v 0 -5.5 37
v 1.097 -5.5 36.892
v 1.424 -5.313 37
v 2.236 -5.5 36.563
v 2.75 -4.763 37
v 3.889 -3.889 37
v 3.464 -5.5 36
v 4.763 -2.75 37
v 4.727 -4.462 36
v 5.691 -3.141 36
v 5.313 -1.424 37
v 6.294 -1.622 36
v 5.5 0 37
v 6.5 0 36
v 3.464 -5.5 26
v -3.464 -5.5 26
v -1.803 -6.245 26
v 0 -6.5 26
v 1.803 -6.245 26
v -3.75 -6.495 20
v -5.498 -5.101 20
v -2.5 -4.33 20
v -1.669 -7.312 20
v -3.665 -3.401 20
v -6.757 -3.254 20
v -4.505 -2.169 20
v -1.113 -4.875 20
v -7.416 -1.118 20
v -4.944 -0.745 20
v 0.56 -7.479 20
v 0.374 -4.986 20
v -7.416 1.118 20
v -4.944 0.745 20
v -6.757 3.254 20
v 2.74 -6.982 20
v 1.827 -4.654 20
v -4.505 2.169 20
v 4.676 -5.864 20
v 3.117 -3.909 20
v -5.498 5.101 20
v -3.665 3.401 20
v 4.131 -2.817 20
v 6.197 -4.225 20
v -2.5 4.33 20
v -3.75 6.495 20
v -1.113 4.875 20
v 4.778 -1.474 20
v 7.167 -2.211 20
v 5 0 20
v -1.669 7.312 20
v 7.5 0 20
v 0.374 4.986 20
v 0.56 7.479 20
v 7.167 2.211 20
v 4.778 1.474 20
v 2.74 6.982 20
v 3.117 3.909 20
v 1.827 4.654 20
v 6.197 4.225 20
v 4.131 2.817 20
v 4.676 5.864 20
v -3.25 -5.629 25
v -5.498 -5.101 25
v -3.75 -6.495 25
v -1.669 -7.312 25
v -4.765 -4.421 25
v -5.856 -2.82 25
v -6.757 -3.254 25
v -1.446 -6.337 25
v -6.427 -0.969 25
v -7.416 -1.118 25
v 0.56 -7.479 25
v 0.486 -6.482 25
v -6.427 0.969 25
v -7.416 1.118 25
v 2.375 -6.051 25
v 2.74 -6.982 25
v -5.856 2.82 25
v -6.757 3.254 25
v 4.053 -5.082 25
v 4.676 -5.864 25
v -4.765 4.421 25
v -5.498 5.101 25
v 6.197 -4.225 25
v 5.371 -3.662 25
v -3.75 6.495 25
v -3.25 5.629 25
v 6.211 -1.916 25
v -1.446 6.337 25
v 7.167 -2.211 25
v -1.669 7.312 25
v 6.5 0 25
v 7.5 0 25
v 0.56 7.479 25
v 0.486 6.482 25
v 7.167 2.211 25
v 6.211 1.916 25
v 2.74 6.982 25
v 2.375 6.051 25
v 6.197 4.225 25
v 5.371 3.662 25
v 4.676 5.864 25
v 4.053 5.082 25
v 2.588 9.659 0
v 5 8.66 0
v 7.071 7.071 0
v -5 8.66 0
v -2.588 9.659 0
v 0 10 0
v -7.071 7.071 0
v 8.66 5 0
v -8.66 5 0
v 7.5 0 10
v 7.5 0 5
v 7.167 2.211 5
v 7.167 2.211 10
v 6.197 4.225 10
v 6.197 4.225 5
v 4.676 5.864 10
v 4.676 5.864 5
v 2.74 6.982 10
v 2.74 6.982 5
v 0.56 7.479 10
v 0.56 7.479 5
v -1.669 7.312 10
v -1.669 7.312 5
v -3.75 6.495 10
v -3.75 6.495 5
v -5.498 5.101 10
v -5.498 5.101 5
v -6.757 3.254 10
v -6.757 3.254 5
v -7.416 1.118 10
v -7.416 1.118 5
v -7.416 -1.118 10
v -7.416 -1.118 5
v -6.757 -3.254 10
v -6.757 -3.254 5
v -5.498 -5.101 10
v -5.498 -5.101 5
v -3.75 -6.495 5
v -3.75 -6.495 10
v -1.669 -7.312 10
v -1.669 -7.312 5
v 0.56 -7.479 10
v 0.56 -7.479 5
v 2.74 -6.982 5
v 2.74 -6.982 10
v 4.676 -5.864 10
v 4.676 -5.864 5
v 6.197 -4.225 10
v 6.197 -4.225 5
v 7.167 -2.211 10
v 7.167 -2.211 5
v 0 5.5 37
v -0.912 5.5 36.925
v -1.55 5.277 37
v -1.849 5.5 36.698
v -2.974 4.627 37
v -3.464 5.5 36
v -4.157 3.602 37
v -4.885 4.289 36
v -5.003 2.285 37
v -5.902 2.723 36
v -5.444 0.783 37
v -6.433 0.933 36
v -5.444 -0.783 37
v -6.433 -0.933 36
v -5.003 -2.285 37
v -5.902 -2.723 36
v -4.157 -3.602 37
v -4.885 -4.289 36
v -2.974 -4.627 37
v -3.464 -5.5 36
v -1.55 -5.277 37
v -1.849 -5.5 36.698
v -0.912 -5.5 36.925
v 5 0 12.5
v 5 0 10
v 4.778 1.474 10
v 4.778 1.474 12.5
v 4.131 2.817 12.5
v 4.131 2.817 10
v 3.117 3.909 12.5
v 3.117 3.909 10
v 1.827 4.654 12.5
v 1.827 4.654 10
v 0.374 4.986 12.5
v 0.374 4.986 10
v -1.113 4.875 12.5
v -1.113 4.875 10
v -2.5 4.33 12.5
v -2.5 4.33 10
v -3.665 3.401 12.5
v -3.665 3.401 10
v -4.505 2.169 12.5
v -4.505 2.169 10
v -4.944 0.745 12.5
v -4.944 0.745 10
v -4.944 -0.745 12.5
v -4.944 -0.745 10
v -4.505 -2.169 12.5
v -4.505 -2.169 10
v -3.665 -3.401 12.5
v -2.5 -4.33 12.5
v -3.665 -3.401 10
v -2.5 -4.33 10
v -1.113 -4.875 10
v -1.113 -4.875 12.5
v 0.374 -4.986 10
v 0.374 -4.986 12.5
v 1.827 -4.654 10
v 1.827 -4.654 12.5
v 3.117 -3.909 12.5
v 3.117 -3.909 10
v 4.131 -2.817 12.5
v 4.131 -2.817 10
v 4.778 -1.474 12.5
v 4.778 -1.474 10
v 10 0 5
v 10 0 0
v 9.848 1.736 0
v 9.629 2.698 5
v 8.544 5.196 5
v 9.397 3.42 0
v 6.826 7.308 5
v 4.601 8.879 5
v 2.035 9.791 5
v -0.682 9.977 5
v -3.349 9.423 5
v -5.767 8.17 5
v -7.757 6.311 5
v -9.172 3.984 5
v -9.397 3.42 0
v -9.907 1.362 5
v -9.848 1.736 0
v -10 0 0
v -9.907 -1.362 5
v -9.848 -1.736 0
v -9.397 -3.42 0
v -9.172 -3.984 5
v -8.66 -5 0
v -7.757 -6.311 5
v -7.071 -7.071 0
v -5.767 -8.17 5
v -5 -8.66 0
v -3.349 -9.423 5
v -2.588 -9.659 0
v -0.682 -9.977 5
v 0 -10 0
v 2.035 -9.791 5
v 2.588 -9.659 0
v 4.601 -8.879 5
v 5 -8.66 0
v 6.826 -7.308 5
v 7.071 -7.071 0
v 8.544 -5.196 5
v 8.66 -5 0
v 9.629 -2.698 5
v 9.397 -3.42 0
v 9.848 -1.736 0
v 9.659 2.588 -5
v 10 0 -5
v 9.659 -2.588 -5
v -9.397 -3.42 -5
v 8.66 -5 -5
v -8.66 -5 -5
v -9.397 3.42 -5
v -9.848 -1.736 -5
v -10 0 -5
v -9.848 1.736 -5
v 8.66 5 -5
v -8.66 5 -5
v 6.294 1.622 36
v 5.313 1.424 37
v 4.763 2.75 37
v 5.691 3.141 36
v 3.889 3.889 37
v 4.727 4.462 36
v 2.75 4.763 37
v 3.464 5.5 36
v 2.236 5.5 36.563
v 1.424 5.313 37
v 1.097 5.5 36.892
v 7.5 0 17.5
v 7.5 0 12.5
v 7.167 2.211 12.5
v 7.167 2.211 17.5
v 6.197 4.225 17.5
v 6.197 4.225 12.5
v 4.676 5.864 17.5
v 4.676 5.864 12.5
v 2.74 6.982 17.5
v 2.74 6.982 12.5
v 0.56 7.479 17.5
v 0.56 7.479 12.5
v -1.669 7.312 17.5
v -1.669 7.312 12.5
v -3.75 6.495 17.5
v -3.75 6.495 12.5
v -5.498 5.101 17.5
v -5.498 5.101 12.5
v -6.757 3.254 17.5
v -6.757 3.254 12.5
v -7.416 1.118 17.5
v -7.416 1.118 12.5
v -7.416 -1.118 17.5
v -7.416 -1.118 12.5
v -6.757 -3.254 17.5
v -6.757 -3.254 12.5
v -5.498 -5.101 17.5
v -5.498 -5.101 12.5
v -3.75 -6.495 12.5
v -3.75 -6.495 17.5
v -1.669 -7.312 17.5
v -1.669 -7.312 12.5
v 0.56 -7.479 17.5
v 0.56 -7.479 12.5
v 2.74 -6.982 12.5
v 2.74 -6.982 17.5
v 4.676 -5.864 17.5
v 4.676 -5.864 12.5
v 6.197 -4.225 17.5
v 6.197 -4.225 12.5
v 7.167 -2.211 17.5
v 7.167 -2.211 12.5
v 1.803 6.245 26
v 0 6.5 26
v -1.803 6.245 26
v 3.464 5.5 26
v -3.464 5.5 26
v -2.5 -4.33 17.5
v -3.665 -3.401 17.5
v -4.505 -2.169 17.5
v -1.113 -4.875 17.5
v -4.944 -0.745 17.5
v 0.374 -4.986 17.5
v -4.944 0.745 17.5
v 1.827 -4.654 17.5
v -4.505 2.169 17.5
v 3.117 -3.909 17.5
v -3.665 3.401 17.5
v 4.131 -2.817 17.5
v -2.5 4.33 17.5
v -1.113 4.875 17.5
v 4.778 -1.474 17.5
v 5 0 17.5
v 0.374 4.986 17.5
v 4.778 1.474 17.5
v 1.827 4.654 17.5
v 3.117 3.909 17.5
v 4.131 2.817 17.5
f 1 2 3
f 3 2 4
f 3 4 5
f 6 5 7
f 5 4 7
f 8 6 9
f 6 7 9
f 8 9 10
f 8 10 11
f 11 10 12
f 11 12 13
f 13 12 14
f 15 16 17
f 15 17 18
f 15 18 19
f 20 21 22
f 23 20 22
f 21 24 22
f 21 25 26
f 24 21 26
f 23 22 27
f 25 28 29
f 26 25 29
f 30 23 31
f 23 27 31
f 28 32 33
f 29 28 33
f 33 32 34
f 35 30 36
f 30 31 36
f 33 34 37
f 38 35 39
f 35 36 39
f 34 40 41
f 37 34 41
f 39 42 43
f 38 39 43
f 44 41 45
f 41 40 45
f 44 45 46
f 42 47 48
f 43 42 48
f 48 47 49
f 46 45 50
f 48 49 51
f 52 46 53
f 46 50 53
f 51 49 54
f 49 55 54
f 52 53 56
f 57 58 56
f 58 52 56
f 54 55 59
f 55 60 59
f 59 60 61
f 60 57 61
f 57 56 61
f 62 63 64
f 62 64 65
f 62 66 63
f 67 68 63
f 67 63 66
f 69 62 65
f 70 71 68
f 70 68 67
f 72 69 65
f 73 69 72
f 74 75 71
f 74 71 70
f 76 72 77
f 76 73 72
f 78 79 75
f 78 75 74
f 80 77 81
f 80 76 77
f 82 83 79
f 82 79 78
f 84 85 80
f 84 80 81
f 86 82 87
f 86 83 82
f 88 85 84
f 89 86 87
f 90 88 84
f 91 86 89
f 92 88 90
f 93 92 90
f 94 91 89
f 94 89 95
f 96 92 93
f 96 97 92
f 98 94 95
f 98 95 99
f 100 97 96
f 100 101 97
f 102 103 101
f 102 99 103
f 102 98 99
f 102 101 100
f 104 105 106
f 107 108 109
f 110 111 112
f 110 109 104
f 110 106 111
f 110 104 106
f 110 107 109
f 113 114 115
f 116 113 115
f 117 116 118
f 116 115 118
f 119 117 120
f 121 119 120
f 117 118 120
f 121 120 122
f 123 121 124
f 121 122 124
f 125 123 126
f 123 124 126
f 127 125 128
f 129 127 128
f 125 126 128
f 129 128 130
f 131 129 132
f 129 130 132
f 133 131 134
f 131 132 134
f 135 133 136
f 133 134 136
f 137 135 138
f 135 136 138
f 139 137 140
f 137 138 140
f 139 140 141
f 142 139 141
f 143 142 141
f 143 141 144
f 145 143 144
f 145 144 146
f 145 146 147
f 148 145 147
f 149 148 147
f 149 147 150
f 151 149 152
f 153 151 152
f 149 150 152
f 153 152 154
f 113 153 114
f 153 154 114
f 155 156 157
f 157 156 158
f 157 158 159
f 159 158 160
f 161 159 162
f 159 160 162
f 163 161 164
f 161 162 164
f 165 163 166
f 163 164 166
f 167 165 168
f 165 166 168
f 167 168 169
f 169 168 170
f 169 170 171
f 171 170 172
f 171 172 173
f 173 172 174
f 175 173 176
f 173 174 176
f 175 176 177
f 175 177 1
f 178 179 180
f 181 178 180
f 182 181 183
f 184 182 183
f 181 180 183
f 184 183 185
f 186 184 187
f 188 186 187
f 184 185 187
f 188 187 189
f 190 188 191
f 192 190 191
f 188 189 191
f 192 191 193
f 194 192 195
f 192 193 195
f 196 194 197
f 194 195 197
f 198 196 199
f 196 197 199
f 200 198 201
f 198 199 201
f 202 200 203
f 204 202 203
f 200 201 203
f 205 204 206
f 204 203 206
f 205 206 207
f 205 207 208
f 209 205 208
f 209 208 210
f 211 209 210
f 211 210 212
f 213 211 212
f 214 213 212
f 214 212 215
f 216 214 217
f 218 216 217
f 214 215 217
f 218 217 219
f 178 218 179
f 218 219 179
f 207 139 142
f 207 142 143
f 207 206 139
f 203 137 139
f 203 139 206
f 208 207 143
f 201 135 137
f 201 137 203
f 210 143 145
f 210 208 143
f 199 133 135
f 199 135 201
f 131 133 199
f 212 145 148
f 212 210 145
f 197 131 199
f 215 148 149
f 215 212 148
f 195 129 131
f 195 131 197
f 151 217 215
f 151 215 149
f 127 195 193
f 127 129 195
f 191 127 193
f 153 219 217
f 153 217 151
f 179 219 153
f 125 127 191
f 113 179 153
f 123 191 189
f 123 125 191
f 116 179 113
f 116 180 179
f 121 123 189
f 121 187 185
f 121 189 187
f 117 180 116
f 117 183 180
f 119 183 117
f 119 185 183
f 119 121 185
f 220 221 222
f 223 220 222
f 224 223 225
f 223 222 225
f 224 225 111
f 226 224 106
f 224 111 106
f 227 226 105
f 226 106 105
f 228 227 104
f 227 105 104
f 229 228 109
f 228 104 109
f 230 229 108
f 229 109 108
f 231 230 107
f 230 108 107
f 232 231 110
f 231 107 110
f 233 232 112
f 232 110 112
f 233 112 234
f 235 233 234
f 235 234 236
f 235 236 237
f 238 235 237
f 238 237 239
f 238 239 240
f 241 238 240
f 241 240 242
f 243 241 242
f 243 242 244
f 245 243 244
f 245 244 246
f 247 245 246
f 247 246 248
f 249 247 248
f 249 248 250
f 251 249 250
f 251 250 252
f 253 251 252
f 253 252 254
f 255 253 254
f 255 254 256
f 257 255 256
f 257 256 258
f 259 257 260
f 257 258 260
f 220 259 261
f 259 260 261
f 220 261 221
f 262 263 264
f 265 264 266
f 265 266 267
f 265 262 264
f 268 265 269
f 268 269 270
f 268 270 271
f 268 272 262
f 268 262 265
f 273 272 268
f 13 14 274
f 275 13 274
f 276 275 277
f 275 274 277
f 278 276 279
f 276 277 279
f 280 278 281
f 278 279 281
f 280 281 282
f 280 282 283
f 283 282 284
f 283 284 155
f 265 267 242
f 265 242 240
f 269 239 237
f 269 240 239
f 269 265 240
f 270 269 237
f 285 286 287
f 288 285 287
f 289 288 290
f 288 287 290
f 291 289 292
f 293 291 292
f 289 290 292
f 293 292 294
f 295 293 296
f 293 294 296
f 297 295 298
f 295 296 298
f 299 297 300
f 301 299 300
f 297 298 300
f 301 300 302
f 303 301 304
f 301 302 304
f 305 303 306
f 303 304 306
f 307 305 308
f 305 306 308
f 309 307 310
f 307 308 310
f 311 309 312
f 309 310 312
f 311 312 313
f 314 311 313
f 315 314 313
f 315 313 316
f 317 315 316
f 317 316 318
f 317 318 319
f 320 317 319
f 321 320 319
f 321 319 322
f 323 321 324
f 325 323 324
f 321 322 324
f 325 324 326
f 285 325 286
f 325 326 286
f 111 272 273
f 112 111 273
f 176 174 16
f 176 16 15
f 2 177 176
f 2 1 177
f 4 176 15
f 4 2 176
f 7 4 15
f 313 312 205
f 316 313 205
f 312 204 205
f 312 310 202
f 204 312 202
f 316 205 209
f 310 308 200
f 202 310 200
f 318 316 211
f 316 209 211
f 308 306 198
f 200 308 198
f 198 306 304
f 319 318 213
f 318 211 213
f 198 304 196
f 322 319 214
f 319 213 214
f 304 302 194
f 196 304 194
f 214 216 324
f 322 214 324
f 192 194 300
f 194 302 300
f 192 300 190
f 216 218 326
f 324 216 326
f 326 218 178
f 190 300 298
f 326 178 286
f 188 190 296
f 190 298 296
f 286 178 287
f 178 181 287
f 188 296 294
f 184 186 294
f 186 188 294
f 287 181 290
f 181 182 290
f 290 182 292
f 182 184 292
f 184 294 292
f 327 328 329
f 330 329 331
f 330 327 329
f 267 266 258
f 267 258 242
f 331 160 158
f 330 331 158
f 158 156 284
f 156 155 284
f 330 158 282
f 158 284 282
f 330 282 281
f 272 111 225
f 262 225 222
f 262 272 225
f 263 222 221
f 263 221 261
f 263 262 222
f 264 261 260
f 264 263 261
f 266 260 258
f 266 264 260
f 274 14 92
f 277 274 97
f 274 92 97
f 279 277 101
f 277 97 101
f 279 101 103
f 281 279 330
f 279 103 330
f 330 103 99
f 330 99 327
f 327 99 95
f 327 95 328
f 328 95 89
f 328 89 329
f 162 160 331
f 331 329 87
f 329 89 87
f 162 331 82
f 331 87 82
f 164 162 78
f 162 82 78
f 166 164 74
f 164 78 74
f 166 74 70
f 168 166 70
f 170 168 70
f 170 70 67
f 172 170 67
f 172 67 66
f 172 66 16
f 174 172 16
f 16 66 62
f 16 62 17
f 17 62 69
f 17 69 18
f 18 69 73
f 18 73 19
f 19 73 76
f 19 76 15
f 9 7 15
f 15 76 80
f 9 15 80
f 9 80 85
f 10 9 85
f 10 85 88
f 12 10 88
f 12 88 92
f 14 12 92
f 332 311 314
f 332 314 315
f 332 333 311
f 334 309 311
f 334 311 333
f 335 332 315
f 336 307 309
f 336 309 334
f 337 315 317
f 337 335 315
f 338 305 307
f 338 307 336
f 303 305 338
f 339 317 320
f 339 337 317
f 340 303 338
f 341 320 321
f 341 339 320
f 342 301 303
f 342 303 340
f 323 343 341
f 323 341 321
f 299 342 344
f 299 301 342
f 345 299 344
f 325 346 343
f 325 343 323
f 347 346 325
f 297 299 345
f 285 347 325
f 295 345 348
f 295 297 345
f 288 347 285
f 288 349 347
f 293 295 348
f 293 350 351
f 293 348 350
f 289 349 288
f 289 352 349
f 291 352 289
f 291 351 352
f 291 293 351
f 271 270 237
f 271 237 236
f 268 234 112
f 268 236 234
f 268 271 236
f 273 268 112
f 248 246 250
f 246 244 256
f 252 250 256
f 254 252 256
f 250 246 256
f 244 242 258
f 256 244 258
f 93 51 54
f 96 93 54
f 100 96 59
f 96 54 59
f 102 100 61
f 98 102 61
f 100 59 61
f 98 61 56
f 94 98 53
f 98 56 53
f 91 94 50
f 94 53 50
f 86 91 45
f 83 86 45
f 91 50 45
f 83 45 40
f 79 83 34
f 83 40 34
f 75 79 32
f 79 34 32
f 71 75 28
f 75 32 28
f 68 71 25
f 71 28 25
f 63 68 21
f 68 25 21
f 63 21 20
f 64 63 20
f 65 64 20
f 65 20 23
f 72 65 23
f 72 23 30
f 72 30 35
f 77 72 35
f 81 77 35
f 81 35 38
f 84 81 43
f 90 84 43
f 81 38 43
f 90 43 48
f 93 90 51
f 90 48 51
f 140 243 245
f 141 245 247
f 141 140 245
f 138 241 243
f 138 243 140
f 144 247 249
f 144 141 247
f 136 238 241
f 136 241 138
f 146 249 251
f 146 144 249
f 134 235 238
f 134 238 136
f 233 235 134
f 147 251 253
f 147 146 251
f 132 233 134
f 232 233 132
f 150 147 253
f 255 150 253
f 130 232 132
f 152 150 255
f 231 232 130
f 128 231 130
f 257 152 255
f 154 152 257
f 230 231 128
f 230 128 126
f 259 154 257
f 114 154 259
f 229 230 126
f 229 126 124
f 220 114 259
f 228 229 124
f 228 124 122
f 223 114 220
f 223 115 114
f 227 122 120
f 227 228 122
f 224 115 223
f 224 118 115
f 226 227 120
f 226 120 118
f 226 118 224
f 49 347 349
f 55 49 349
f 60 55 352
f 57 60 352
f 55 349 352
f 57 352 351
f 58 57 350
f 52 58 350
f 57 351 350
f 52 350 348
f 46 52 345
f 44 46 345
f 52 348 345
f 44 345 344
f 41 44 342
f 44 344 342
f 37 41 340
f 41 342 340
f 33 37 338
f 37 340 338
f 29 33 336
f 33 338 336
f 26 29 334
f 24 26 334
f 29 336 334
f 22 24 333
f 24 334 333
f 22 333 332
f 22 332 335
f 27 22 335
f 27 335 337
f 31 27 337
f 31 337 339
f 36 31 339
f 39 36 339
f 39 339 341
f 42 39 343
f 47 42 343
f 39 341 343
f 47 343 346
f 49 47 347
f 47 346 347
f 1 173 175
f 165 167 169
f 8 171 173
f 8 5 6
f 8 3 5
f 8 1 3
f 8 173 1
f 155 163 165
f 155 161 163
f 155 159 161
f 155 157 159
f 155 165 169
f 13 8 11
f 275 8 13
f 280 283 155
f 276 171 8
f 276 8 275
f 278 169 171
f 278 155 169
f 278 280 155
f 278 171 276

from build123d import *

# Parameters (mm, degrees)
SZKIC2_R                    = 10
DODANIE_WYCI_GNI_CIE1_DEPTH = 5
SZKIC3_R                    = 7.5
DODANIE_WYCI_GNI_CIE2_DEPTH = 5
SZKIC4_R                    = 5
DODANIE_WYCI_GNI_CIE3_DEPTH = 2.5
SZKIC5_R                    = 7.5
DODANIE_WYCI_GNI_CIE4_DEPTH = 5
SZKIC6_R                    = 5
DODANIE_WYCI_GNI_CIE5_DEPTH = 2.5
SZKIC7_R                    = 7.5
DODANIE_WYCI_GNI_CIE6_DEPTH = 5
SZKIC8_R                    = 6.5
DODANIE_WYCI_GNI_CIE7_DEPTH = 12
SZKIC10_W                   = 8
SZKIC10_H                   = 2
WYTNIJ_WYCI_GNI_CIE1_DEPTH  = 11
DODANIE_WYCI_GNI_CIE8_START = 5
SZKIC11_R                   = 10
DODANIE_WYCI_GNI_CIE8_DEPTH = 5
WYTNIJ_WYCI_GNI_CIE2_DEPTH  = 5


with BuildPart() as part:
    # Szkic2 → Dodanie-wyciągnięcie1 (new body)
    with BuildSketch(Plane.XY):
        Circle(SZKIC2_R)
    extrude(amount=DODANIE_WYCI_GNI_CIE1_DEPTH)

    # Szkic3 → Dodanie-wyciągnięcie2 (add)
    with BuildSketch(Plane.XY.offset(5)):
        Circle(SZKIC3_R)
    extrude(amount=DODANIE_WYCI_GNI_CIE2_DEPTH)

    # Szkic4 → Dodanie-wyciągnięcie3 (add)
    with BuildSketch(Plane.XY.offset(10)):
        Circle(SZKIC4_R)
    extrude(amount=DODANIE_WYCI_GNI_CIE3_DEPTH)

    # Szkic5 → Dodanie-wyciągnięcie4 (add)
    with BuildSketch(Plane.XY.offset(12.5)):
        Circle(SZKIC5_R)
    extrude(amount=DODANIE_WYCI_GNI_CIE4_DEPTH)

    # Szkic6 → Dodanie-wyciągnięcie5 (add)
    with BuildSketch(Plane.XY.offset(17.5)):
        Circle(SZKIC6_R)
    extrude(amount=DODANIE_WYCI_GNI_CIE5_DEPTH)

    # Szkic7 → Dodanie-wyciągnięcie6 (add)
    with BuildSketch(Plane.XY.offset(20)):
        Circle(SZKIC7_R)
    extrude(amount=DODANIE_WYCI_GNI_CIE6_DEPTH)

    # Szkic8 → Dodanie-wyciągnięcie7 (add)
    with BuildSketch(Plane.XY.offset(25)):
        Circle(SZKIC8_R)
    extrude(amount=DODANIE_WYCI_GNI_CIE7_DEPTH)

    # Szkic10 → Wytnij-wyciągnięcie1 (cut)
    with BuildSketch(Plane.XY.offset(37)):
        with Locations((0, 6.5)):
            Rectangle(SZKIC10_W, SZKIC10_H)
        with Locations((0, -6.5)):
            Rectangle(SZKIC10_W, SZKIC10_H)
    extrude(amount=-WYTNIJ_WYCI_GNI_CIE1_DEPTH, mode=Mode.SUBTRACT)

    # Szkic11 → Dodanie-wyciągnięcie8 (add)
    with BuildSketch(Plane(origin=(0, 0, 0), x_dir=(-1, 0, 0), z_dir=(0, 0, -1)).offset(DODANIE_WYCI_GNI_CIE8_START)):
        Circle(SZKIC11_R)
    extrude(amount=-DODANIE_WYCI_GNI_CIE8_DEPTH)

    # Szkic13 → Wytnij-wyciągnięcie2 (cut)
    with BuildSketch(Plane(origin=(0, 0, -5), x_dir=(-1, 0, 0), z_dir=(0, 0, -1))):
        with BuildLine():
            Line((-8.660254038, -5), (8.660254038, -5))
            ThreePointArc((8.660254038, -5), (0, -10), (-8.660254038, -5))
        make_face()
        with BuildLine():
            Line((-8.660254038, 5), (8.660254038, 5))
            ThreePointArc((8.660254038, 5), (0, 10), (-8.660254038, 5))
        make_face()
    extrude(amount=-WYTNIJ_WYCI_GNI_CIE2_DEPTH, mode=Mode.SUBTRACT)

    # Sfazowanie1: read off the stored shape, not the designer's step
    # Sfazowanie1 outline → Sfazowanie1 (revolve, cut)
    with BuildSketch(Plane.XZ):
        Polygon((6.5, 37.000001298), (5.499998702, 37.000001298), (6.5, 36), align=None)
    revolve(axis=Axis((0, 0, 0), (0, 0, 1)), mode=Mode.SUBTRACT)


solid = part.part
